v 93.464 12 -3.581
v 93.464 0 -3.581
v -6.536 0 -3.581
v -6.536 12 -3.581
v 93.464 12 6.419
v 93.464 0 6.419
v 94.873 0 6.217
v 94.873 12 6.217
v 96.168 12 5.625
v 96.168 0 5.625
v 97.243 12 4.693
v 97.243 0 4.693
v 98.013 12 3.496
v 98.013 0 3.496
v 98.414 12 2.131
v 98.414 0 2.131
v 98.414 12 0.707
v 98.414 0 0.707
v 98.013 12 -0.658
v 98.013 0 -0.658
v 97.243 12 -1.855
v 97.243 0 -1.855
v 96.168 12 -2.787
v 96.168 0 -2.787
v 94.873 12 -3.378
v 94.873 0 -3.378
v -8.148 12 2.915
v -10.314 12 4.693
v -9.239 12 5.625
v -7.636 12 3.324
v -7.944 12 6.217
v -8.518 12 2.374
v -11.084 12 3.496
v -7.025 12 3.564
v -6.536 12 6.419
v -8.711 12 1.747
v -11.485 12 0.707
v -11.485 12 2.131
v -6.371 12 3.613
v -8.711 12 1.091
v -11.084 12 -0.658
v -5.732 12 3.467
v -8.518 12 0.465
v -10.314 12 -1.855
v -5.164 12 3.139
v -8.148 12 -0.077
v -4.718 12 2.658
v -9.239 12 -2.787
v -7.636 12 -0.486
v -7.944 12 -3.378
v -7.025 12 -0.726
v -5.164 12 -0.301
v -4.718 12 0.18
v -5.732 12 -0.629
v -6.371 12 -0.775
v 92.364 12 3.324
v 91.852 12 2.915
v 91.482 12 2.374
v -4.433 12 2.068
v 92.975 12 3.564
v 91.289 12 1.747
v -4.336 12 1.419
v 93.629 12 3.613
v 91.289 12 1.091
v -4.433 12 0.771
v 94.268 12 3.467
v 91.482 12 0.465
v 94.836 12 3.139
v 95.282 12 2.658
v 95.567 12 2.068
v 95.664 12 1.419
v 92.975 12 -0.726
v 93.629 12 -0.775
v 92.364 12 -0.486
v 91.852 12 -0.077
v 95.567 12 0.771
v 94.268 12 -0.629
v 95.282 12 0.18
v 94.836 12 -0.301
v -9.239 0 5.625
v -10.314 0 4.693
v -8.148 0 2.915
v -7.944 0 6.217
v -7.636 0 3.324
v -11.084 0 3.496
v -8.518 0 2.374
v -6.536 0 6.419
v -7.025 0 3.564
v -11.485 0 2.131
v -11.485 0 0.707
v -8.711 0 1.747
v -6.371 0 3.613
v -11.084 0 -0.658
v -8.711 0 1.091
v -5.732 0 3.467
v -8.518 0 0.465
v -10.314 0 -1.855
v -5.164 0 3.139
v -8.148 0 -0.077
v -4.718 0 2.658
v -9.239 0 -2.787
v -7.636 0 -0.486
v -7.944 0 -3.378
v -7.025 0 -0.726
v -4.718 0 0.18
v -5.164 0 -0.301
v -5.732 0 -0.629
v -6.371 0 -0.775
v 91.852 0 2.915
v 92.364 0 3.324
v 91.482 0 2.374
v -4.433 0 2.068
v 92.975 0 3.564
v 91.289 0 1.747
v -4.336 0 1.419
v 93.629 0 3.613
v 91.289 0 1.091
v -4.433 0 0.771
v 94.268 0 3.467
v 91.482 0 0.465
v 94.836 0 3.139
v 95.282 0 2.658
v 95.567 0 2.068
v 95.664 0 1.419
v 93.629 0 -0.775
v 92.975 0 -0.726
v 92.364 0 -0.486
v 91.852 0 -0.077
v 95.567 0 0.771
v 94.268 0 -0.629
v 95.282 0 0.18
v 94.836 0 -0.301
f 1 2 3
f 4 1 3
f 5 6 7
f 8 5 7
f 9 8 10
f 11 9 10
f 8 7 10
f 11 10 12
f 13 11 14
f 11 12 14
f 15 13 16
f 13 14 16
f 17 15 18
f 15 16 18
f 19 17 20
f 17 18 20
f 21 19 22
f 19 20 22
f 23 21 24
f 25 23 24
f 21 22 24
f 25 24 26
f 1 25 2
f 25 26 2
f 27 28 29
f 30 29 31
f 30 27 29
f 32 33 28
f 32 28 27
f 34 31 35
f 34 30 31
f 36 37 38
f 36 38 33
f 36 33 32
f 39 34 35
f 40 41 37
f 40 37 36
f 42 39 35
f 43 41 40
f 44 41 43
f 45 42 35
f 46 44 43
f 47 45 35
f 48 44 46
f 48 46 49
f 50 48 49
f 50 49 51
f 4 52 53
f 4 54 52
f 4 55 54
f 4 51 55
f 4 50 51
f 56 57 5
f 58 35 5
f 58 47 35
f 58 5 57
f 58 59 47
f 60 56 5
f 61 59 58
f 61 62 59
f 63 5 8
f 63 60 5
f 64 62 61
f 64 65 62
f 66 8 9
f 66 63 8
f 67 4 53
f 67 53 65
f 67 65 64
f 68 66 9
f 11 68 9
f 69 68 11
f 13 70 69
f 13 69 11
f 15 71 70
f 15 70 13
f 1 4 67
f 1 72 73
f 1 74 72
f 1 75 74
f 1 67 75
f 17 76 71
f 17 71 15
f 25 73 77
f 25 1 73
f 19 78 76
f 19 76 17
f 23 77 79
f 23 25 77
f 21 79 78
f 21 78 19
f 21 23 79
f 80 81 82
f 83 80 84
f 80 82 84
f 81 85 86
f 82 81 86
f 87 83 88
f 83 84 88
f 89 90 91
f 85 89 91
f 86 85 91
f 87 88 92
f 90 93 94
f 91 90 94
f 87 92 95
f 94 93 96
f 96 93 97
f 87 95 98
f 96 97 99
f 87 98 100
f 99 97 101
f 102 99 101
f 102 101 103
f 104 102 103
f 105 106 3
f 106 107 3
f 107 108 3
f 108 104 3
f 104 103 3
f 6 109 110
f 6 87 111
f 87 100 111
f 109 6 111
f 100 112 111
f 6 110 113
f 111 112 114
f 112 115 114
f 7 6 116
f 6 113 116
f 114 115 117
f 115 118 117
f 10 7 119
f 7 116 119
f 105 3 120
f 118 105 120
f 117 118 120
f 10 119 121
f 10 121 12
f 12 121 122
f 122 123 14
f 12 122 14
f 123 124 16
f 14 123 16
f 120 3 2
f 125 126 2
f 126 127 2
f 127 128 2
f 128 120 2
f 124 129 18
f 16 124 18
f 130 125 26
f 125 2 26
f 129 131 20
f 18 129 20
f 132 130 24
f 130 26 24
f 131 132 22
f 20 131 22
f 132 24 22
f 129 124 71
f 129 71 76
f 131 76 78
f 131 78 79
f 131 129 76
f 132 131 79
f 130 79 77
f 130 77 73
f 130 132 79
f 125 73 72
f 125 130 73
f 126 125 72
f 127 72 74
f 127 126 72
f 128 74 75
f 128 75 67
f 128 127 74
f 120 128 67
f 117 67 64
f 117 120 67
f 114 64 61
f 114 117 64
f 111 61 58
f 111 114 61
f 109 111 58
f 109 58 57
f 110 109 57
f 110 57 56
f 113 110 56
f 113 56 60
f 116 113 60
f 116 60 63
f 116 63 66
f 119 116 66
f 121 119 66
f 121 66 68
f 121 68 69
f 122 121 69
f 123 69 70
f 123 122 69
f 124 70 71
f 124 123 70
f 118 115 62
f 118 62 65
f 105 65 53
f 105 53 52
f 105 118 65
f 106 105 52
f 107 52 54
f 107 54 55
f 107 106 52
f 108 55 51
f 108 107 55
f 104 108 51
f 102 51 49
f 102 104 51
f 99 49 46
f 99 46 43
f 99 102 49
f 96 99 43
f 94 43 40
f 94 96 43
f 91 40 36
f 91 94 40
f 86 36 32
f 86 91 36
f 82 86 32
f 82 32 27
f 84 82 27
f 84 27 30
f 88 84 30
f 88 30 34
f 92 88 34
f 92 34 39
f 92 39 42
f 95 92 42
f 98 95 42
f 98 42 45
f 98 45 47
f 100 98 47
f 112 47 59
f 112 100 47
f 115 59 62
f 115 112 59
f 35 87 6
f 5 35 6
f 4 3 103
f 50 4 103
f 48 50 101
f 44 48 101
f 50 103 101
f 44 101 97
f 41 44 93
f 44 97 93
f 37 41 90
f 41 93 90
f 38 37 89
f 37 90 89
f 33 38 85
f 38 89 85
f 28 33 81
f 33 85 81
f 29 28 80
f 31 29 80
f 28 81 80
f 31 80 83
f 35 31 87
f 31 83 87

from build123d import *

# Parameters (mm, degrees)
SKETCH1_R           = 2.2
BOSS_EXTRUDE1_DEPTH = 12


with BuildPart() as part:
    # Sketch1 → Boss-Extrude1 (new body)
    with BuildSketch(Plane(origin=(0, 0, 0), x_dir=(1, 0, 0), z_dir=(0, 1, 0))):
        with BuildLine():
            ThreePointArc((-6.535515489, 3.580947173), (-11.535515489, -1.419052827), (-6.535515489, -6.419052827))
            Line((-6.535515489, -6.419052827), (93.464484511, -6.419052827))
            ThreePointArc((93.464484511, -6.419052827), (98.464484511, -1.419052827), (93.464484511, 3.580947173))
            Line((93.464484511, 3.580947173), (-6.535515489, 3.580947173))
        make_face()
        with Locations((-6.535515489, -1.419052827)):
            Circle(SKETCH1_R, mode=Mode.SUBTRACT)
        with Locations((93.464484511, -1.419052827)):
            Circle(SKETCH1_R, mode=Mode.SUBTRACT)
    extrude(amount=BOSS_EXTRUDE1_DEPTH)


solid = part.part
